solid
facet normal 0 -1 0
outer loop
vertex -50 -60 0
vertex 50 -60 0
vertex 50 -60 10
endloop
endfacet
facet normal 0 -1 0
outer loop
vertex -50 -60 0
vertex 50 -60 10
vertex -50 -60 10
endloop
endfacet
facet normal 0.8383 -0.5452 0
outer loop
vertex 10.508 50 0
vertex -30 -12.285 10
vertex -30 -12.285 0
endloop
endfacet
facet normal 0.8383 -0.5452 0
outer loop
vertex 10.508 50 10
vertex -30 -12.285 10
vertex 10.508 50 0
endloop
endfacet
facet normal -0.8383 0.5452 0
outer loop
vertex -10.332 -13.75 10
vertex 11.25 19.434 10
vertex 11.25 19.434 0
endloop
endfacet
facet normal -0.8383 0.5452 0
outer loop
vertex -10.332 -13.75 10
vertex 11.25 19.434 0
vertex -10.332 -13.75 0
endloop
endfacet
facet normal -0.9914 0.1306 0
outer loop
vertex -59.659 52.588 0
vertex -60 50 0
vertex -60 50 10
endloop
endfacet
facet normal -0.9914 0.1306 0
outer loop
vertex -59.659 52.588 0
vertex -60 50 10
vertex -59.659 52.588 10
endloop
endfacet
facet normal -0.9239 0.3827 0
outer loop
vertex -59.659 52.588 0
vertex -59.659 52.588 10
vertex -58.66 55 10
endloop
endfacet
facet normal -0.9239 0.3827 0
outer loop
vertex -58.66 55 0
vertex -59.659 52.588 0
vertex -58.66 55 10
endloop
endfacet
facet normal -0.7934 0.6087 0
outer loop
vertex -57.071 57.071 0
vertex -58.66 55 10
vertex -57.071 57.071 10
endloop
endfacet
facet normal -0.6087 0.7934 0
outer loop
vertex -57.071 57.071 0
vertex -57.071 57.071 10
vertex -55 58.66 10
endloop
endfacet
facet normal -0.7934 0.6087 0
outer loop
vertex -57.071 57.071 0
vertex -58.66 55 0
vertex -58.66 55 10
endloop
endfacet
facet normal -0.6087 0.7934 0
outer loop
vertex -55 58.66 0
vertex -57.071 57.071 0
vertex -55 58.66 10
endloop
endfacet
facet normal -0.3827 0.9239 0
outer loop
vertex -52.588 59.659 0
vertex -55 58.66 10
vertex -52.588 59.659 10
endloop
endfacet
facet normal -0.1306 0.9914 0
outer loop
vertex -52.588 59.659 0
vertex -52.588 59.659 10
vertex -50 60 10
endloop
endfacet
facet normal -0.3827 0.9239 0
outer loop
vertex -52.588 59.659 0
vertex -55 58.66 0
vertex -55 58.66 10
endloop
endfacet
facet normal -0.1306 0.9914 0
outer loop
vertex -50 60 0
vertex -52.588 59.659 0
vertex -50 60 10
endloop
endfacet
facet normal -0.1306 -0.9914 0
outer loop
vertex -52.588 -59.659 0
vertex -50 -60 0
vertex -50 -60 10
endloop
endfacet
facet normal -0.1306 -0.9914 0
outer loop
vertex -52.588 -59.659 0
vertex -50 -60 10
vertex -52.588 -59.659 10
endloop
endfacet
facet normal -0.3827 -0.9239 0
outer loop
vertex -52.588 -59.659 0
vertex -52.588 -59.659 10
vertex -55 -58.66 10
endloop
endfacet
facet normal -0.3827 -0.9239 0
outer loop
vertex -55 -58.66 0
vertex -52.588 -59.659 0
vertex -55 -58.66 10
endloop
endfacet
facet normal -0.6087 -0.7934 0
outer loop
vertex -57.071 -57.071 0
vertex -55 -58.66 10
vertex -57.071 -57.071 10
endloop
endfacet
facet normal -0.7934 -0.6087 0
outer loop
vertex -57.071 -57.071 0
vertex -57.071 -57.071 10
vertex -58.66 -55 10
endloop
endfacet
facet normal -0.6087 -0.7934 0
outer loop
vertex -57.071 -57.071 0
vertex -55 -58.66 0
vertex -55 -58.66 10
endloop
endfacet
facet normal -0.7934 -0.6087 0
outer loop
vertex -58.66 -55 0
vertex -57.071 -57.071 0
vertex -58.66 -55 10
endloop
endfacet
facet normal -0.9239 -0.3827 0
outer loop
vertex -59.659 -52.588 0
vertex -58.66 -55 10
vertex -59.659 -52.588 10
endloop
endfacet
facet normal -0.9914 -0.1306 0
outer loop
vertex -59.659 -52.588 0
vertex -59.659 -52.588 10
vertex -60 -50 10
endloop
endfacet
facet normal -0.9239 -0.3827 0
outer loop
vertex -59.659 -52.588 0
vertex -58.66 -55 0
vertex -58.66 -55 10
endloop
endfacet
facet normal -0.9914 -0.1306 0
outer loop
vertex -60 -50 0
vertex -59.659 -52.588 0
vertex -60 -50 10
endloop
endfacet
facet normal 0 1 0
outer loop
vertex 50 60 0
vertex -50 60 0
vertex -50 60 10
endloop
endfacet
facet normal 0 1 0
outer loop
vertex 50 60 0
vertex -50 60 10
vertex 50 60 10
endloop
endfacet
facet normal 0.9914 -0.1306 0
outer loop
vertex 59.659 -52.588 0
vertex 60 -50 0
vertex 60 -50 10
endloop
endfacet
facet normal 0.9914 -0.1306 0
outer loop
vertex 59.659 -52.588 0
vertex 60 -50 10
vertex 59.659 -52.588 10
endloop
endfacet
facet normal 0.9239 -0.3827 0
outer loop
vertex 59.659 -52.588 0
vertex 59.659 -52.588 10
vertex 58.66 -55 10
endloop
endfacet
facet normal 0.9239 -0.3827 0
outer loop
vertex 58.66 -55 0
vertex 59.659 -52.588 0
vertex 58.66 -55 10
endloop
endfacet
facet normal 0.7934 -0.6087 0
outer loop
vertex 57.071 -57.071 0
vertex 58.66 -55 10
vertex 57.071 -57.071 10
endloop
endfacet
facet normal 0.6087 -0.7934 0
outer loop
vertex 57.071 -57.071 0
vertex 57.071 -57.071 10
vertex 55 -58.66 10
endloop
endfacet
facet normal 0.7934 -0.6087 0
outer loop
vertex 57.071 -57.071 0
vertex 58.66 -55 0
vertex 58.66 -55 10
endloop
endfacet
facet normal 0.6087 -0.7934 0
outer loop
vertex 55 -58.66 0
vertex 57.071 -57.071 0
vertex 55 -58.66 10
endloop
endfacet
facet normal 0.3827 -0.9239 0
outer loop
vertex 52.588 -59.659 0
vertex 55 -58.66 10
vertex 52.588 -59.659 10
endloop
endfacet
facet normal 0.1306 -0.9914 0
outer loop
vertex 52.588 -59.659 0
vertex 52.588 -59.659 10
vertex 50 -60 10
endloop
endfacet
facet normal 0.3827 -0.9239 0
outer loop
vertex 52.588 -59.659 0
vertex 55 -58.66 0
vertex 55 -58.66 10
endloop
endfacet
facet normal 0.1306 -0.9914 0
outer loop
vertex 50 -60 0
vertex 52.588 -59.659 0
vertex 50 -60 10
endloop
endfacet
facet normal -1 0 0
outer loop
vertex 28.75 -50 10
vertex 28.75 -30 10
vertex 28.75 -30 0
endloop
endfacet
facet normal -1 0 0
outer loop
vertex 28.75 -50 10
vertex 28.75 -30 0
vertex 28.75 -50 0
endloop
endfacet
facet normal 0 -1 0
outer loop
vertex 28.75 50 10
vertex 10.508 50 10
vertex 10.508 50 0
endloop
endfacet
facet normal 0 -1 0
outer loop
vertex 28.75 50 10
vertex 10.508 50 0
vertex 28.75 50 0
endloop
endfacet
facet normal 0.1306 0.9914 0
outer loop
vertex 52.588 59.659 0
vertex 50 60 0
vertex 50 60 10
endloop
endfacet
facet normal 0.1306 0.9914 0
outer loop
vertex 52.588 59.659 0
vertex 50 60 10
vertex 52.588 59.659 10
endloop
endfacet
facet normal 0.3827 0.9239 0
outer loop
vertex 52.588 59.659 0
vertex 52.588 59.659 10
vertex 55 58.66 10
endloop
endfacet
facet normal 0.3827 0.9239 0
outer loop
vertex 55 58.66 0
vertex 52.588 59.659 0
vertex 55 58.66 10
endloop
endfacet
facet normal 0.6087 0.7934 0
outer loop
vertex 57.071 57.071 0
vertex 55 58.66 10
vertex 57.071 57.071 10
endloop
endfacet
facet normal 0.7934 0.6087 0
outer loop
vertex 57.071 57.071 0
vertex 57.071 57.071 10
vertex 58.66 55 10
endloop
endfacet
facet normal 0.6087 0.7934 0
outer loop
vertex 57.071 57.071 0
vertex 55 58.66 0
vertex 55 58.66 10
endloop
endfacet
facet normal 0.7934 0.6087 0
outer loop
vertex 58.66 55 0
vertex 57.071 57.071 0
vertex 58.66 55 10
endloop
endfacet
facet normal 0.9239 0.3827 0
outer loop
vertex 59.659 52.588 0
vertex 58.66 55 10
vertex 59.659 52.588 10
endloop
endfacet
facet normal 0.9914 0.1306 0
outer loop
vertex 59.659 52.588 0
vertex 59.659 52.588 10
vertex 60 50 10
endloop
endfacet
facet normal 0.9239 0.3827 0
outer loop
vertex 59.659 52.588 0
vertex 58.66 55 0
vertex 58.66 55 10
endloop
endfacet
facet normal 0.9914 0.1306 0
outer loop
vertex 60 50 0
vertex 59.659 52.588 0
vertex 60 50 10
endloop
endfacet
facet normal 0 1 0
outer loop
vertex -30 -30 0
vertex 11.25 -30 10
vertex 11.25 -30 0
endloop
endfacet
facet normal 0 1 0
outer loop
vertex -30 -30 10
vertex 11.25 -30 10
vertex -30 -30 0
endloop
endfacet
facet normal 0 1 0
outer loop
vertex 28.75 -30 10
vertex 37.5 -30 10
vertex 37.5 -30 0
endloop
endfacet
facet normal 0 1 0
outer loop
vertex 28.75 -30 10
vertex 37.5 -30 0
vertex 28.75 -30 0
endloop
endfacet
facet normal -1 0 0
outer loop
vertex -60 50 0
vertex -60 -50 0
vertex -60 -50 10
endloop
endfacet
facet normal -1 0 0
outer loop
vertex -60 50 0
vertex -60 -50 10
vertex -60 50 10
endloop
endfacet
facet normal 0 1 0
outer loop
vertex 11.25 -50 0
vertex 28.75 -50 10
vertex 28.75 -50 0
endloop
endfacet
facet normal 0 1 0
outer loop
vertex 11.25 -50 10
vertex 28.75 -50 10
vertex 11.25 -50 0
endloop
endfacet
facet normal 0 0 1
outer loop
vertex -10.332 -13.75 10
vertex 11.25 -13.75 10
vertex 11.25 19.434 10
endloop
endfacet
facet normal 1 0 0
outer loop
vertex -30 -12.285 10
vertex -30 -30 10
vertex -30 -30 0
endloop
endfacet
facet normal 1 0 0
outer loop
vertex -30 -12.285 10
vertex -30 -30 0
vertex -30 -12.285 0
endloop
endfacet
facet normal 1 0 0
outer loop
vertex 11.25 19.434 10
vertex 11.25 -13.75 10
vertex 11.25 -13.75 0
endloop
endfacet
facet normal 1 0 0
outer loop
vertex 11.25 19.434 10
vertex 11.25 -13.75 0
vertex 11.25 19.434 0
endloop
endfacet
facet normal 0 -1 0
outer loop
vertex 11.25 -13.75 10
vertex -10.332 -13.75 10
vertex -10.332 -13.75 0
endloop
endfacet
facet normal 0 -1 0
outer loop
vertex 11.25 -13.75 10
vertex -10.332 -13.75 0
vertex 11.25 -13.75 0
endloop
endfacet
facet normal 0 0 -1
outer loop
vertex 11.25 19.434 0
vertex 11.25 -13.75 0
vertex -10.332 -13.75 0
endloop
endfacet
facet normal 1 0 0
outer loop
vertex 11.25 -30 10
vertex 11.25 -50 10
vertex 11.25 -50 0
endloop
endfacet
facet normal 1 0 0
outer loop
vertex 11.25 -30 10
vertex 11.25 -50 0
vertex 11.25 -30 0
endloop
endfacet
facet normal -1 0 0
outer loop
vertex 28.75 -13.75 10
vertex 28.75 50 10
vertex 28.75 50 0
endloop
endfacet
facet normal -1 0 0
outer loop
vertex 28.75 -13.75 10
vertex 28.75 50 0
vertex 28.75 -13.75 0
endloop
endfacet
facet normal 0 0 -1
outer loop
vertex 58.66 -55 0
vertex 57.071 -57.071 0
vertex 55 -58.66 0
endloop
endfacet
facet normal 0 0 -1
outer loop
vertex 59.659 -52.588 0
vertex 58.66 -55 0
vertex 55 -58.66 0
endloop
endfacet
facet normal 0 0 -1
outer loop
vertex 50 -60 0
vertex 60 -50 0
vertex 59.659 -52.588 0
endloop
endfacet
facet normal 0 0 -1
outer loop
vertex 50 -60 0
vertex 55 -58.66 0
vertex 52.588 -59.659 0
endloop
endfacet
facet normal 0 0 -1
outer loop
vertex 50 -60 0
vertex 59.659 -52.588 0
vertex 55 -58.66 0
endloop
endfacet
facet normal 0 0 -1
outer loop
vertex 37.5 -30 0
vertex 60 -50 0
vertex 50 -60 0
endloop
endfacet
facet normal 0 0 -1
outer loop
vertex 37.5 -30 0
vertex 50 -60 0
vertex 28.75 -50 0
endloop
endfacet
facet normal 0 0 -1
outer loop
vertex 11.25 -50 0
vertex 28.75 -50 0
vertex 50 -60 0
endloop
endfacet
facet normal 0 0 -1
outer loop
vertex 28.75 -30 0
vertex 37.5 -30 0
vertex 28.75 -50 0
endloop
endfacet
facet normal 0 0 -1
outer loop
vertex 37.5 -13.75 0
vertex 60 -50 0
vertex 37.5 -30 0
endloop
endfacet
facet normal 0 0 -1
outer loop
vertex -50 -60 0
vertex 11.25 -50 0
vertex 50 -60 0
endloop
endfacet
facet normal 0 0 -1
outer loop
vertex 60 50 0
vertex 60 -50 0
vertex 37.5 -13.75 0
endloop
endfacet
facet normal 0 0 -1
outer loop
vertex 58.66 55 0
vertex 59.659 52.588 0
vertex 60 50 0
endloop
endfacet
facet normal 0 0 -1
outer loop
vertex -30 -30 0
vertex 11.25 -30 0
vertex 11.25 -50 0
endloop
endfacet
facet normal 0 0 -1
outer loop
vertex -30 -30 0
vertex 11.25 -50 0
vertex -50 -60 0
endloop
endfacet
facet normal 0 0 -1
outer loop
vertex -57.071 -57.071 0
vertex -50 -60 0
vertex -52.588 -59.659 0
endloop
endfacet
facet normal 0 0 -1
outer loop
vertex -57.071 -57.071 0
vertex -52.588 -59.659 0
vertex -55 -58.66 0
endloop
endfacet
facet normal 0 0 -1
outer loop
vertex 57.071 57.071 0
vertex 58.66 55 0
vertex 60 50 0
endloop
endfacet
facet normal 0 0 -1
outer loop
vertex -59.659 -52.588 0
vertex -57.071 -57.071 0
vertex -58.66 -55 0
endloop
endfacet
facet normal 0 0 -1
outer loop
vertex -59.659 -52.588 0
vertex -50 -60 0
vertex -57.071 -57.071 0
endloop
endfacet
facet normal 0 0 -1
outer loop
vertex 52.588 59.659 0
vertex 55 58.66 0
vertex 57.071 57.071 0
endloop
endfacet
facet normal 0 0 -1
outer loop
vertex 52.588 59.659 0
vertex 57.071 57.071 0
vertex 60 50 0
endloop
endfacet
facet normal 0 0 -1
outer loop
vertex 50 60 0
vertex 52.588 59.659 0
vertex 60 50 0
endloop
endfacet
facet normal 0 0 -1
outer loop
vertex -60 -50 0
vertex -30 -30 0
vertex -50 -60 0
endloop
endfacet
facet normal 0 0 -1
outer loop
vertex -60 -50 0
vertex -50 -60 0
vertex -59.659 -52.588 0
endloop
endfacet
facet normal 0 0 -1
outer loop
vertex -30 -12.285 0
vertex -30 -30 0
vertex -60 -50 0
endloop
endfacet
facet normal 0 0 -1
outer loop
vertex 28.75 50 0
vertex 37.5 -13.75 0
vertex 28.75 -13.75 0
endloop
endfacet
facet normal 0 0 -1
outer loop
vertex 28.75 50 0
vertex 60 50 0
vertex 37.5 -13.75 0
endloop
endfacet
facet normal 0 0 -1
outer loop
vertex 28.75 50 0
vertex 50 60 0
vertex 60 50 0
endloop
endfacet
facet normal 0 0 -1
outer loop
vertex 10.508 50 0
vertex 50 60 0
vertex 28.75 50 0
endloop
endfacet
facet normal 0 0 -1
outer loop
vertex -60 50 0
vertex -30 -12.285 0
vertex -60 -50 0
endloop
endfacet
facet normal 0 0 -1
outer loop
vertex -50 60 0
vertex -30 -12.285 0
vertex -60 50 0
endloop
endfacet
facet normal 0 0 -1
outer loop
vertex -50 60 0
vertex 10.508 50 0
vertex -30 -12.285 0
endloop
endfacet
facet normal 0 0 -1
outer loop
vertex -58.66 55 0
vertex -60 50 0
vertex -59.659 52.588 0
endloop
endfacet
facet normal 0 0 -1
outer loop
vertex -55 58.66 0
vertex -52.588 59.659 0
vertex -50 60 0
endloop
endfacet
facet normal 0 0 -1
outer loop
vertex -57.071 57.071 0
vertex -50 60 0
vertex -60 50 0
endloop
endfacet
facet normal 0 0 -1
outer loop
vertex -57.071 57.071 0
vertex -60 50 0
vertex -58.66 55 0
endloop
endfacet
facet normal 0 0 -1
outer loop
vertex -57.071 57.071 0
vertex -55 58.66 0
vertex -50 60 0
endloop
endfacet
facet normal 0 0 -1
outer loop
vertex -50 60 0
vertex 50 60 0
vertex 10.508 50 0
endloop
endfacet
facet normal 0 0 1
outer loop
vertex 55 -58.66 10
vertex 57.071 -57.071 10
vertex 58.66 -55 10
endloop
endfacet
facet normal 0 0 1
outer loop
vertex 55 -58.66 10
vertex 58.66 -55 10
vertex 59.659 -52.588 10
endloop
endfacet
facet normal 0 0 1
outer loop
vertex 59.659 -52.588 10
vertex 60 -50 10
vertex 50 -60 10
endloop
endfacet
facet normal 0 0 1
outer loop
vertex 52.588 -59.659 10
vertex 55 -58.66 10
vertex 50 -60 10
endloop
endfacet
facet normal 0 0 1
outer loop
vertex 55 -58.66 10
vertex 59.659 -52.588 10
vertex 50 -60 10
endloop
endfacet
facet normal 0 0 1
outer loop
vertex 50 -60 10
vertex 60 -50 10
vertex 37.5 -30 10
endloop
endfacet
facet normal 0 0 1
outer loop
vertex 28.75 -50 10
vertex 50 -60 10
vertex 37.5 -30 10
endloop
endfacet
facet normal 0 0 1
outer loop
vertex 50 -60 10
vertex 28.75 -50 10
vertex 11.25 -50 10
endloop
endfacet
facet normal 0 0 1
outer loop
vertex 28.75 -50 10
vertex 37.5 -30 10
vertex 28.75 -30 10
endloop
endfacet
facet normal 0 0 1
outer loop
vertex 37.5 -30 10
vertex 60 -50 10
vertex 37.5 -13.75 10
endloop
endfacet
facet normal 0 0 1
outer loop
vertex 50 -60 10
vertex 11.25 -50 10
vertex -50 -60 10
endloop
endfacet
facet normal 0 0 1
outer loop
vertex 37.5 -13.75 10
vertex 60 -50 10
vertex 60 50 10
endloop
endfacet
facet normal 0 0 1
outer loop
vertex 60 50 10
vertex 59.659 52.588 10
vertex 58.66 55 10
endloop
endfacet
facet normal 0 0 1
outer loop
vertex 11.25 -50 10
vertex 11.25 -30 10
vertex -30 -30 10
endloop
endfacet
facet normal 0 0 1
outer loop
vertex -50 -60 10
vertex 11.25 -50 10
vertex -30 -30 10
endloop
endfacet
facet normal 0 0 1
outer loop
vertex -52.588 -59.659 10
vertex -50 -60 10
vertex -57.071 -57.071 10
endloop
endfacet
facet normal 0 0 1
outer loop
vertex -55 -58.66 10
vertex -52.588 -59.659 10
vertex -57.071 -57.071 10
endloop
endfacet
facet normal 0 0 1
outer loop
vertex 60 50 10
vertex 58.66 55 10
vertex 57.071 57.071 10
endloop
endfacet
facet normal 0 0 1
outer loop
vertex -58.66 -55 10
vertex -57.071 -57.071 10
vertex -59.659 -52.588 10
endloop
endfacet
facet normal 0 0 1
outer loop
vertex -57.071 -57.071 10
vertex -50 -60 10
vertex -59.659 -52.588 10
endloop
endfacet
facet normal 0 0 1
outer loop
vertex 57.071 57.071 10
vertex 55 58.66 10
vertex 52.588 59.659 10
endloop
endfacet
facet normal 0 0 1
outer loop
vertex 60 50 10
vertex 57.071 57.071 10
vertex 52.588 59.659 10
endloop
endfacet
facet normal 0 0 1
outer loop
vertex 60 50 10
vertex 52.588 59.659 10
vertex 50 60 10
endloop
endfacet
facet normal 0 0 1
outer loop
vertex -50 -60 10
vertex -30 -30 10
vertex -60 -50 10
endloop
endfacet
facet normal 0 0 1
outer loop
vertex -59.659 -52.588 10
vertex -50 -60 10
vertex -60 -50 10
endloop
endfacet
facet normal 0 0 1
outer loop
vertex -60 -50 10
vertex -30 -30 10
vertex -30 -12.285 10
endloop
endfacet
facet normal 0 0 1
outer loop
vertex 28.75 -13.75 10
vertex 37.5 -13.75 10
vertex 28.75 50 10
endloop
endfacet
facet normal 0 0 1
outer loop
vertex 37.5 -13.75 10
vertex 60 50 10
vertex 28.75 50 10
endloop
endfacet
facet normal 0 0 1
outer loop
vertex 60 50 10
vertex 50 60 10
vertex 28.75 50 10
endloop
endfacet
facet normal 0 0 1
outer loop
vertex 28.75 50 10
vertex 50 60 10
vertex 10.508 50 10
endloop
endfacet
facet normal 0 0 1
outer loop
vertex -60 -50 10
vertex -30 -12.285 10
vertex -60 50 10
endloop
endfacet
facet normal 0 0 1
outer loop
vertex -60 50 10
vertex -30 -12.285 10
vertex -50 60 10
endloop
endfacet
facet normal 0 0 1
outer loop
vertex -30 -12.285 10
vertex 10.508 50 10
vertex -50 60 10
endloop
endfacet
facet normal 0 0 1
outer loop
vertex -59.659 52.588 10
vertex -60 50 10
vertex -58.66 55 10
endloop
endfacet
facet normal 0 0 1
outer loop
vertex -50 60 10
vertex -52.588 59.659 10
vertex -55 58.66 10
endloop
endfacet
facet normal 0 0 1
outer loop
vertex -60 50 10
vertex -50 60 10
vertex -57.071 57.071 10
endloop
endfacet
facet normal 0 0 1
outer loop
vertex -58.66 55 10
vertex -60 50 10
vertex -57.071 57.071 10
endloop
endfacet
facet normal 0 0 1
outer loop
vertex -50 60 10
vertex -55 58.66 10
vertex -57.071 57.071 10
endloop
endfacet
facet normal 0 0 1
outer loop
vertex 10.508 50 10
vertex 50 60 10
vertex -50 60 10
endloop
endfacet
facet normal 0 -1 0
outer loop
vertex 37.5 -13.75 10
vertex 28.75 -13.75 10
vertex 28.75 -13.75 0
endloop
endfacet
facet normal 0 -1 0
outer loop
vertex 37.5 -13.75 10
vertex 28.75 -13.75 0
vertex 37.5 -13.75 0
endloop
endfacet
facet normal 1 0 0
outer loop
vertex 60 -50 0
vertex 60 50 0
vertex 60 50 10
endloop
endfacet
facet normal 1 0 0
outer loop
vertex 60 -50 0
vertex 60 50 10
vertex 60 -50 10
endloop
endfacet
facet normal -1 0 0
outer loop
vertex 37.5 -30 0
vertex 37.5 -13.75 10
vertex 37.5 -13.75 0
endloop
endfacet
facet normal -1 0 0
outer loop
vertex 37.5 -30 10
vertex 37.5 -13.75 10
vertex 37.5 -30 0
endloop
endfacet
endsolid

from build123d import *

# Parameters (mm, degrees)
BOSS_EXTRUDE1_DEPTH = 10
CUT_EXTRUDE2_DEPTH  = 10


with BuildPart() as part:
    # Sketch1 → Boss-Extrude1 (new body)
    with BuildSketch(Plane.XY):
        with BuildLine():
            Line((-50, 60), (50, 60))
            ThreePointArc((50, 60), (57.071067812, 57.071067812), (60, 50))
            Line((60, 50), (60, -50))
            ThreePointArc((60, -50), (57.071067812, -57.071067812), (50, -60))
            Line((50, -60), (-50, -60))
            ThreePointArc((-50, -60), (-57.071067812, -57.071067812), (-60, -50))
            Line((-60, -50), (-60, 50))
            ThreePointArc((-60, 50), (-57.071067812, 57.071067812), (-50, 60))
        make_face()
    extrude(amount=BOSS_EXTRUDE1_DEPTH)

    # Sketch2 → Cut-Extrude2 (cut)
    with BuildSketch(Plane.XY.offset(10)):
        Polygon((10.5078125, 50), (28.75, 50), (28.75, -13.75), (37.5, -13.75), (37.5, -30), (28.75, -30), (28.75, -50), (11.25, -50), (11.25, -30), (-30, -30), (-30, -12.28515625), align=None)
        Polygon((11.25, -13.75), (11.25, 19.43359375), (-10.33203125, -13.75), align=None, mode=Mode.SUBTRACT)
    extrude(amount=-CUT_EXTRUDE2_DEPTH, mode=Mode.SUBTRACT)


with BuildPart() as cut_extrude2_piece_1:
    # of the separate pieces the step leaves, piece 1, a body of its own (cut_extrude2_pieces)
    add(part.part.solids().sort_by_distance((-50, 60, 0))[0])


with BuildPart() as cut_extrude2_piece_2:
    # of the separate pieces the step leaves, piece 2, a body of its own (cut_extrude2_pieces)
    add(part.part.solids().sort_by_distance((11.25, -13.75, 0))[0])


solid = Compound([cut_extrude2_piece_1.part, cut_extrude2_piece_2.part])
